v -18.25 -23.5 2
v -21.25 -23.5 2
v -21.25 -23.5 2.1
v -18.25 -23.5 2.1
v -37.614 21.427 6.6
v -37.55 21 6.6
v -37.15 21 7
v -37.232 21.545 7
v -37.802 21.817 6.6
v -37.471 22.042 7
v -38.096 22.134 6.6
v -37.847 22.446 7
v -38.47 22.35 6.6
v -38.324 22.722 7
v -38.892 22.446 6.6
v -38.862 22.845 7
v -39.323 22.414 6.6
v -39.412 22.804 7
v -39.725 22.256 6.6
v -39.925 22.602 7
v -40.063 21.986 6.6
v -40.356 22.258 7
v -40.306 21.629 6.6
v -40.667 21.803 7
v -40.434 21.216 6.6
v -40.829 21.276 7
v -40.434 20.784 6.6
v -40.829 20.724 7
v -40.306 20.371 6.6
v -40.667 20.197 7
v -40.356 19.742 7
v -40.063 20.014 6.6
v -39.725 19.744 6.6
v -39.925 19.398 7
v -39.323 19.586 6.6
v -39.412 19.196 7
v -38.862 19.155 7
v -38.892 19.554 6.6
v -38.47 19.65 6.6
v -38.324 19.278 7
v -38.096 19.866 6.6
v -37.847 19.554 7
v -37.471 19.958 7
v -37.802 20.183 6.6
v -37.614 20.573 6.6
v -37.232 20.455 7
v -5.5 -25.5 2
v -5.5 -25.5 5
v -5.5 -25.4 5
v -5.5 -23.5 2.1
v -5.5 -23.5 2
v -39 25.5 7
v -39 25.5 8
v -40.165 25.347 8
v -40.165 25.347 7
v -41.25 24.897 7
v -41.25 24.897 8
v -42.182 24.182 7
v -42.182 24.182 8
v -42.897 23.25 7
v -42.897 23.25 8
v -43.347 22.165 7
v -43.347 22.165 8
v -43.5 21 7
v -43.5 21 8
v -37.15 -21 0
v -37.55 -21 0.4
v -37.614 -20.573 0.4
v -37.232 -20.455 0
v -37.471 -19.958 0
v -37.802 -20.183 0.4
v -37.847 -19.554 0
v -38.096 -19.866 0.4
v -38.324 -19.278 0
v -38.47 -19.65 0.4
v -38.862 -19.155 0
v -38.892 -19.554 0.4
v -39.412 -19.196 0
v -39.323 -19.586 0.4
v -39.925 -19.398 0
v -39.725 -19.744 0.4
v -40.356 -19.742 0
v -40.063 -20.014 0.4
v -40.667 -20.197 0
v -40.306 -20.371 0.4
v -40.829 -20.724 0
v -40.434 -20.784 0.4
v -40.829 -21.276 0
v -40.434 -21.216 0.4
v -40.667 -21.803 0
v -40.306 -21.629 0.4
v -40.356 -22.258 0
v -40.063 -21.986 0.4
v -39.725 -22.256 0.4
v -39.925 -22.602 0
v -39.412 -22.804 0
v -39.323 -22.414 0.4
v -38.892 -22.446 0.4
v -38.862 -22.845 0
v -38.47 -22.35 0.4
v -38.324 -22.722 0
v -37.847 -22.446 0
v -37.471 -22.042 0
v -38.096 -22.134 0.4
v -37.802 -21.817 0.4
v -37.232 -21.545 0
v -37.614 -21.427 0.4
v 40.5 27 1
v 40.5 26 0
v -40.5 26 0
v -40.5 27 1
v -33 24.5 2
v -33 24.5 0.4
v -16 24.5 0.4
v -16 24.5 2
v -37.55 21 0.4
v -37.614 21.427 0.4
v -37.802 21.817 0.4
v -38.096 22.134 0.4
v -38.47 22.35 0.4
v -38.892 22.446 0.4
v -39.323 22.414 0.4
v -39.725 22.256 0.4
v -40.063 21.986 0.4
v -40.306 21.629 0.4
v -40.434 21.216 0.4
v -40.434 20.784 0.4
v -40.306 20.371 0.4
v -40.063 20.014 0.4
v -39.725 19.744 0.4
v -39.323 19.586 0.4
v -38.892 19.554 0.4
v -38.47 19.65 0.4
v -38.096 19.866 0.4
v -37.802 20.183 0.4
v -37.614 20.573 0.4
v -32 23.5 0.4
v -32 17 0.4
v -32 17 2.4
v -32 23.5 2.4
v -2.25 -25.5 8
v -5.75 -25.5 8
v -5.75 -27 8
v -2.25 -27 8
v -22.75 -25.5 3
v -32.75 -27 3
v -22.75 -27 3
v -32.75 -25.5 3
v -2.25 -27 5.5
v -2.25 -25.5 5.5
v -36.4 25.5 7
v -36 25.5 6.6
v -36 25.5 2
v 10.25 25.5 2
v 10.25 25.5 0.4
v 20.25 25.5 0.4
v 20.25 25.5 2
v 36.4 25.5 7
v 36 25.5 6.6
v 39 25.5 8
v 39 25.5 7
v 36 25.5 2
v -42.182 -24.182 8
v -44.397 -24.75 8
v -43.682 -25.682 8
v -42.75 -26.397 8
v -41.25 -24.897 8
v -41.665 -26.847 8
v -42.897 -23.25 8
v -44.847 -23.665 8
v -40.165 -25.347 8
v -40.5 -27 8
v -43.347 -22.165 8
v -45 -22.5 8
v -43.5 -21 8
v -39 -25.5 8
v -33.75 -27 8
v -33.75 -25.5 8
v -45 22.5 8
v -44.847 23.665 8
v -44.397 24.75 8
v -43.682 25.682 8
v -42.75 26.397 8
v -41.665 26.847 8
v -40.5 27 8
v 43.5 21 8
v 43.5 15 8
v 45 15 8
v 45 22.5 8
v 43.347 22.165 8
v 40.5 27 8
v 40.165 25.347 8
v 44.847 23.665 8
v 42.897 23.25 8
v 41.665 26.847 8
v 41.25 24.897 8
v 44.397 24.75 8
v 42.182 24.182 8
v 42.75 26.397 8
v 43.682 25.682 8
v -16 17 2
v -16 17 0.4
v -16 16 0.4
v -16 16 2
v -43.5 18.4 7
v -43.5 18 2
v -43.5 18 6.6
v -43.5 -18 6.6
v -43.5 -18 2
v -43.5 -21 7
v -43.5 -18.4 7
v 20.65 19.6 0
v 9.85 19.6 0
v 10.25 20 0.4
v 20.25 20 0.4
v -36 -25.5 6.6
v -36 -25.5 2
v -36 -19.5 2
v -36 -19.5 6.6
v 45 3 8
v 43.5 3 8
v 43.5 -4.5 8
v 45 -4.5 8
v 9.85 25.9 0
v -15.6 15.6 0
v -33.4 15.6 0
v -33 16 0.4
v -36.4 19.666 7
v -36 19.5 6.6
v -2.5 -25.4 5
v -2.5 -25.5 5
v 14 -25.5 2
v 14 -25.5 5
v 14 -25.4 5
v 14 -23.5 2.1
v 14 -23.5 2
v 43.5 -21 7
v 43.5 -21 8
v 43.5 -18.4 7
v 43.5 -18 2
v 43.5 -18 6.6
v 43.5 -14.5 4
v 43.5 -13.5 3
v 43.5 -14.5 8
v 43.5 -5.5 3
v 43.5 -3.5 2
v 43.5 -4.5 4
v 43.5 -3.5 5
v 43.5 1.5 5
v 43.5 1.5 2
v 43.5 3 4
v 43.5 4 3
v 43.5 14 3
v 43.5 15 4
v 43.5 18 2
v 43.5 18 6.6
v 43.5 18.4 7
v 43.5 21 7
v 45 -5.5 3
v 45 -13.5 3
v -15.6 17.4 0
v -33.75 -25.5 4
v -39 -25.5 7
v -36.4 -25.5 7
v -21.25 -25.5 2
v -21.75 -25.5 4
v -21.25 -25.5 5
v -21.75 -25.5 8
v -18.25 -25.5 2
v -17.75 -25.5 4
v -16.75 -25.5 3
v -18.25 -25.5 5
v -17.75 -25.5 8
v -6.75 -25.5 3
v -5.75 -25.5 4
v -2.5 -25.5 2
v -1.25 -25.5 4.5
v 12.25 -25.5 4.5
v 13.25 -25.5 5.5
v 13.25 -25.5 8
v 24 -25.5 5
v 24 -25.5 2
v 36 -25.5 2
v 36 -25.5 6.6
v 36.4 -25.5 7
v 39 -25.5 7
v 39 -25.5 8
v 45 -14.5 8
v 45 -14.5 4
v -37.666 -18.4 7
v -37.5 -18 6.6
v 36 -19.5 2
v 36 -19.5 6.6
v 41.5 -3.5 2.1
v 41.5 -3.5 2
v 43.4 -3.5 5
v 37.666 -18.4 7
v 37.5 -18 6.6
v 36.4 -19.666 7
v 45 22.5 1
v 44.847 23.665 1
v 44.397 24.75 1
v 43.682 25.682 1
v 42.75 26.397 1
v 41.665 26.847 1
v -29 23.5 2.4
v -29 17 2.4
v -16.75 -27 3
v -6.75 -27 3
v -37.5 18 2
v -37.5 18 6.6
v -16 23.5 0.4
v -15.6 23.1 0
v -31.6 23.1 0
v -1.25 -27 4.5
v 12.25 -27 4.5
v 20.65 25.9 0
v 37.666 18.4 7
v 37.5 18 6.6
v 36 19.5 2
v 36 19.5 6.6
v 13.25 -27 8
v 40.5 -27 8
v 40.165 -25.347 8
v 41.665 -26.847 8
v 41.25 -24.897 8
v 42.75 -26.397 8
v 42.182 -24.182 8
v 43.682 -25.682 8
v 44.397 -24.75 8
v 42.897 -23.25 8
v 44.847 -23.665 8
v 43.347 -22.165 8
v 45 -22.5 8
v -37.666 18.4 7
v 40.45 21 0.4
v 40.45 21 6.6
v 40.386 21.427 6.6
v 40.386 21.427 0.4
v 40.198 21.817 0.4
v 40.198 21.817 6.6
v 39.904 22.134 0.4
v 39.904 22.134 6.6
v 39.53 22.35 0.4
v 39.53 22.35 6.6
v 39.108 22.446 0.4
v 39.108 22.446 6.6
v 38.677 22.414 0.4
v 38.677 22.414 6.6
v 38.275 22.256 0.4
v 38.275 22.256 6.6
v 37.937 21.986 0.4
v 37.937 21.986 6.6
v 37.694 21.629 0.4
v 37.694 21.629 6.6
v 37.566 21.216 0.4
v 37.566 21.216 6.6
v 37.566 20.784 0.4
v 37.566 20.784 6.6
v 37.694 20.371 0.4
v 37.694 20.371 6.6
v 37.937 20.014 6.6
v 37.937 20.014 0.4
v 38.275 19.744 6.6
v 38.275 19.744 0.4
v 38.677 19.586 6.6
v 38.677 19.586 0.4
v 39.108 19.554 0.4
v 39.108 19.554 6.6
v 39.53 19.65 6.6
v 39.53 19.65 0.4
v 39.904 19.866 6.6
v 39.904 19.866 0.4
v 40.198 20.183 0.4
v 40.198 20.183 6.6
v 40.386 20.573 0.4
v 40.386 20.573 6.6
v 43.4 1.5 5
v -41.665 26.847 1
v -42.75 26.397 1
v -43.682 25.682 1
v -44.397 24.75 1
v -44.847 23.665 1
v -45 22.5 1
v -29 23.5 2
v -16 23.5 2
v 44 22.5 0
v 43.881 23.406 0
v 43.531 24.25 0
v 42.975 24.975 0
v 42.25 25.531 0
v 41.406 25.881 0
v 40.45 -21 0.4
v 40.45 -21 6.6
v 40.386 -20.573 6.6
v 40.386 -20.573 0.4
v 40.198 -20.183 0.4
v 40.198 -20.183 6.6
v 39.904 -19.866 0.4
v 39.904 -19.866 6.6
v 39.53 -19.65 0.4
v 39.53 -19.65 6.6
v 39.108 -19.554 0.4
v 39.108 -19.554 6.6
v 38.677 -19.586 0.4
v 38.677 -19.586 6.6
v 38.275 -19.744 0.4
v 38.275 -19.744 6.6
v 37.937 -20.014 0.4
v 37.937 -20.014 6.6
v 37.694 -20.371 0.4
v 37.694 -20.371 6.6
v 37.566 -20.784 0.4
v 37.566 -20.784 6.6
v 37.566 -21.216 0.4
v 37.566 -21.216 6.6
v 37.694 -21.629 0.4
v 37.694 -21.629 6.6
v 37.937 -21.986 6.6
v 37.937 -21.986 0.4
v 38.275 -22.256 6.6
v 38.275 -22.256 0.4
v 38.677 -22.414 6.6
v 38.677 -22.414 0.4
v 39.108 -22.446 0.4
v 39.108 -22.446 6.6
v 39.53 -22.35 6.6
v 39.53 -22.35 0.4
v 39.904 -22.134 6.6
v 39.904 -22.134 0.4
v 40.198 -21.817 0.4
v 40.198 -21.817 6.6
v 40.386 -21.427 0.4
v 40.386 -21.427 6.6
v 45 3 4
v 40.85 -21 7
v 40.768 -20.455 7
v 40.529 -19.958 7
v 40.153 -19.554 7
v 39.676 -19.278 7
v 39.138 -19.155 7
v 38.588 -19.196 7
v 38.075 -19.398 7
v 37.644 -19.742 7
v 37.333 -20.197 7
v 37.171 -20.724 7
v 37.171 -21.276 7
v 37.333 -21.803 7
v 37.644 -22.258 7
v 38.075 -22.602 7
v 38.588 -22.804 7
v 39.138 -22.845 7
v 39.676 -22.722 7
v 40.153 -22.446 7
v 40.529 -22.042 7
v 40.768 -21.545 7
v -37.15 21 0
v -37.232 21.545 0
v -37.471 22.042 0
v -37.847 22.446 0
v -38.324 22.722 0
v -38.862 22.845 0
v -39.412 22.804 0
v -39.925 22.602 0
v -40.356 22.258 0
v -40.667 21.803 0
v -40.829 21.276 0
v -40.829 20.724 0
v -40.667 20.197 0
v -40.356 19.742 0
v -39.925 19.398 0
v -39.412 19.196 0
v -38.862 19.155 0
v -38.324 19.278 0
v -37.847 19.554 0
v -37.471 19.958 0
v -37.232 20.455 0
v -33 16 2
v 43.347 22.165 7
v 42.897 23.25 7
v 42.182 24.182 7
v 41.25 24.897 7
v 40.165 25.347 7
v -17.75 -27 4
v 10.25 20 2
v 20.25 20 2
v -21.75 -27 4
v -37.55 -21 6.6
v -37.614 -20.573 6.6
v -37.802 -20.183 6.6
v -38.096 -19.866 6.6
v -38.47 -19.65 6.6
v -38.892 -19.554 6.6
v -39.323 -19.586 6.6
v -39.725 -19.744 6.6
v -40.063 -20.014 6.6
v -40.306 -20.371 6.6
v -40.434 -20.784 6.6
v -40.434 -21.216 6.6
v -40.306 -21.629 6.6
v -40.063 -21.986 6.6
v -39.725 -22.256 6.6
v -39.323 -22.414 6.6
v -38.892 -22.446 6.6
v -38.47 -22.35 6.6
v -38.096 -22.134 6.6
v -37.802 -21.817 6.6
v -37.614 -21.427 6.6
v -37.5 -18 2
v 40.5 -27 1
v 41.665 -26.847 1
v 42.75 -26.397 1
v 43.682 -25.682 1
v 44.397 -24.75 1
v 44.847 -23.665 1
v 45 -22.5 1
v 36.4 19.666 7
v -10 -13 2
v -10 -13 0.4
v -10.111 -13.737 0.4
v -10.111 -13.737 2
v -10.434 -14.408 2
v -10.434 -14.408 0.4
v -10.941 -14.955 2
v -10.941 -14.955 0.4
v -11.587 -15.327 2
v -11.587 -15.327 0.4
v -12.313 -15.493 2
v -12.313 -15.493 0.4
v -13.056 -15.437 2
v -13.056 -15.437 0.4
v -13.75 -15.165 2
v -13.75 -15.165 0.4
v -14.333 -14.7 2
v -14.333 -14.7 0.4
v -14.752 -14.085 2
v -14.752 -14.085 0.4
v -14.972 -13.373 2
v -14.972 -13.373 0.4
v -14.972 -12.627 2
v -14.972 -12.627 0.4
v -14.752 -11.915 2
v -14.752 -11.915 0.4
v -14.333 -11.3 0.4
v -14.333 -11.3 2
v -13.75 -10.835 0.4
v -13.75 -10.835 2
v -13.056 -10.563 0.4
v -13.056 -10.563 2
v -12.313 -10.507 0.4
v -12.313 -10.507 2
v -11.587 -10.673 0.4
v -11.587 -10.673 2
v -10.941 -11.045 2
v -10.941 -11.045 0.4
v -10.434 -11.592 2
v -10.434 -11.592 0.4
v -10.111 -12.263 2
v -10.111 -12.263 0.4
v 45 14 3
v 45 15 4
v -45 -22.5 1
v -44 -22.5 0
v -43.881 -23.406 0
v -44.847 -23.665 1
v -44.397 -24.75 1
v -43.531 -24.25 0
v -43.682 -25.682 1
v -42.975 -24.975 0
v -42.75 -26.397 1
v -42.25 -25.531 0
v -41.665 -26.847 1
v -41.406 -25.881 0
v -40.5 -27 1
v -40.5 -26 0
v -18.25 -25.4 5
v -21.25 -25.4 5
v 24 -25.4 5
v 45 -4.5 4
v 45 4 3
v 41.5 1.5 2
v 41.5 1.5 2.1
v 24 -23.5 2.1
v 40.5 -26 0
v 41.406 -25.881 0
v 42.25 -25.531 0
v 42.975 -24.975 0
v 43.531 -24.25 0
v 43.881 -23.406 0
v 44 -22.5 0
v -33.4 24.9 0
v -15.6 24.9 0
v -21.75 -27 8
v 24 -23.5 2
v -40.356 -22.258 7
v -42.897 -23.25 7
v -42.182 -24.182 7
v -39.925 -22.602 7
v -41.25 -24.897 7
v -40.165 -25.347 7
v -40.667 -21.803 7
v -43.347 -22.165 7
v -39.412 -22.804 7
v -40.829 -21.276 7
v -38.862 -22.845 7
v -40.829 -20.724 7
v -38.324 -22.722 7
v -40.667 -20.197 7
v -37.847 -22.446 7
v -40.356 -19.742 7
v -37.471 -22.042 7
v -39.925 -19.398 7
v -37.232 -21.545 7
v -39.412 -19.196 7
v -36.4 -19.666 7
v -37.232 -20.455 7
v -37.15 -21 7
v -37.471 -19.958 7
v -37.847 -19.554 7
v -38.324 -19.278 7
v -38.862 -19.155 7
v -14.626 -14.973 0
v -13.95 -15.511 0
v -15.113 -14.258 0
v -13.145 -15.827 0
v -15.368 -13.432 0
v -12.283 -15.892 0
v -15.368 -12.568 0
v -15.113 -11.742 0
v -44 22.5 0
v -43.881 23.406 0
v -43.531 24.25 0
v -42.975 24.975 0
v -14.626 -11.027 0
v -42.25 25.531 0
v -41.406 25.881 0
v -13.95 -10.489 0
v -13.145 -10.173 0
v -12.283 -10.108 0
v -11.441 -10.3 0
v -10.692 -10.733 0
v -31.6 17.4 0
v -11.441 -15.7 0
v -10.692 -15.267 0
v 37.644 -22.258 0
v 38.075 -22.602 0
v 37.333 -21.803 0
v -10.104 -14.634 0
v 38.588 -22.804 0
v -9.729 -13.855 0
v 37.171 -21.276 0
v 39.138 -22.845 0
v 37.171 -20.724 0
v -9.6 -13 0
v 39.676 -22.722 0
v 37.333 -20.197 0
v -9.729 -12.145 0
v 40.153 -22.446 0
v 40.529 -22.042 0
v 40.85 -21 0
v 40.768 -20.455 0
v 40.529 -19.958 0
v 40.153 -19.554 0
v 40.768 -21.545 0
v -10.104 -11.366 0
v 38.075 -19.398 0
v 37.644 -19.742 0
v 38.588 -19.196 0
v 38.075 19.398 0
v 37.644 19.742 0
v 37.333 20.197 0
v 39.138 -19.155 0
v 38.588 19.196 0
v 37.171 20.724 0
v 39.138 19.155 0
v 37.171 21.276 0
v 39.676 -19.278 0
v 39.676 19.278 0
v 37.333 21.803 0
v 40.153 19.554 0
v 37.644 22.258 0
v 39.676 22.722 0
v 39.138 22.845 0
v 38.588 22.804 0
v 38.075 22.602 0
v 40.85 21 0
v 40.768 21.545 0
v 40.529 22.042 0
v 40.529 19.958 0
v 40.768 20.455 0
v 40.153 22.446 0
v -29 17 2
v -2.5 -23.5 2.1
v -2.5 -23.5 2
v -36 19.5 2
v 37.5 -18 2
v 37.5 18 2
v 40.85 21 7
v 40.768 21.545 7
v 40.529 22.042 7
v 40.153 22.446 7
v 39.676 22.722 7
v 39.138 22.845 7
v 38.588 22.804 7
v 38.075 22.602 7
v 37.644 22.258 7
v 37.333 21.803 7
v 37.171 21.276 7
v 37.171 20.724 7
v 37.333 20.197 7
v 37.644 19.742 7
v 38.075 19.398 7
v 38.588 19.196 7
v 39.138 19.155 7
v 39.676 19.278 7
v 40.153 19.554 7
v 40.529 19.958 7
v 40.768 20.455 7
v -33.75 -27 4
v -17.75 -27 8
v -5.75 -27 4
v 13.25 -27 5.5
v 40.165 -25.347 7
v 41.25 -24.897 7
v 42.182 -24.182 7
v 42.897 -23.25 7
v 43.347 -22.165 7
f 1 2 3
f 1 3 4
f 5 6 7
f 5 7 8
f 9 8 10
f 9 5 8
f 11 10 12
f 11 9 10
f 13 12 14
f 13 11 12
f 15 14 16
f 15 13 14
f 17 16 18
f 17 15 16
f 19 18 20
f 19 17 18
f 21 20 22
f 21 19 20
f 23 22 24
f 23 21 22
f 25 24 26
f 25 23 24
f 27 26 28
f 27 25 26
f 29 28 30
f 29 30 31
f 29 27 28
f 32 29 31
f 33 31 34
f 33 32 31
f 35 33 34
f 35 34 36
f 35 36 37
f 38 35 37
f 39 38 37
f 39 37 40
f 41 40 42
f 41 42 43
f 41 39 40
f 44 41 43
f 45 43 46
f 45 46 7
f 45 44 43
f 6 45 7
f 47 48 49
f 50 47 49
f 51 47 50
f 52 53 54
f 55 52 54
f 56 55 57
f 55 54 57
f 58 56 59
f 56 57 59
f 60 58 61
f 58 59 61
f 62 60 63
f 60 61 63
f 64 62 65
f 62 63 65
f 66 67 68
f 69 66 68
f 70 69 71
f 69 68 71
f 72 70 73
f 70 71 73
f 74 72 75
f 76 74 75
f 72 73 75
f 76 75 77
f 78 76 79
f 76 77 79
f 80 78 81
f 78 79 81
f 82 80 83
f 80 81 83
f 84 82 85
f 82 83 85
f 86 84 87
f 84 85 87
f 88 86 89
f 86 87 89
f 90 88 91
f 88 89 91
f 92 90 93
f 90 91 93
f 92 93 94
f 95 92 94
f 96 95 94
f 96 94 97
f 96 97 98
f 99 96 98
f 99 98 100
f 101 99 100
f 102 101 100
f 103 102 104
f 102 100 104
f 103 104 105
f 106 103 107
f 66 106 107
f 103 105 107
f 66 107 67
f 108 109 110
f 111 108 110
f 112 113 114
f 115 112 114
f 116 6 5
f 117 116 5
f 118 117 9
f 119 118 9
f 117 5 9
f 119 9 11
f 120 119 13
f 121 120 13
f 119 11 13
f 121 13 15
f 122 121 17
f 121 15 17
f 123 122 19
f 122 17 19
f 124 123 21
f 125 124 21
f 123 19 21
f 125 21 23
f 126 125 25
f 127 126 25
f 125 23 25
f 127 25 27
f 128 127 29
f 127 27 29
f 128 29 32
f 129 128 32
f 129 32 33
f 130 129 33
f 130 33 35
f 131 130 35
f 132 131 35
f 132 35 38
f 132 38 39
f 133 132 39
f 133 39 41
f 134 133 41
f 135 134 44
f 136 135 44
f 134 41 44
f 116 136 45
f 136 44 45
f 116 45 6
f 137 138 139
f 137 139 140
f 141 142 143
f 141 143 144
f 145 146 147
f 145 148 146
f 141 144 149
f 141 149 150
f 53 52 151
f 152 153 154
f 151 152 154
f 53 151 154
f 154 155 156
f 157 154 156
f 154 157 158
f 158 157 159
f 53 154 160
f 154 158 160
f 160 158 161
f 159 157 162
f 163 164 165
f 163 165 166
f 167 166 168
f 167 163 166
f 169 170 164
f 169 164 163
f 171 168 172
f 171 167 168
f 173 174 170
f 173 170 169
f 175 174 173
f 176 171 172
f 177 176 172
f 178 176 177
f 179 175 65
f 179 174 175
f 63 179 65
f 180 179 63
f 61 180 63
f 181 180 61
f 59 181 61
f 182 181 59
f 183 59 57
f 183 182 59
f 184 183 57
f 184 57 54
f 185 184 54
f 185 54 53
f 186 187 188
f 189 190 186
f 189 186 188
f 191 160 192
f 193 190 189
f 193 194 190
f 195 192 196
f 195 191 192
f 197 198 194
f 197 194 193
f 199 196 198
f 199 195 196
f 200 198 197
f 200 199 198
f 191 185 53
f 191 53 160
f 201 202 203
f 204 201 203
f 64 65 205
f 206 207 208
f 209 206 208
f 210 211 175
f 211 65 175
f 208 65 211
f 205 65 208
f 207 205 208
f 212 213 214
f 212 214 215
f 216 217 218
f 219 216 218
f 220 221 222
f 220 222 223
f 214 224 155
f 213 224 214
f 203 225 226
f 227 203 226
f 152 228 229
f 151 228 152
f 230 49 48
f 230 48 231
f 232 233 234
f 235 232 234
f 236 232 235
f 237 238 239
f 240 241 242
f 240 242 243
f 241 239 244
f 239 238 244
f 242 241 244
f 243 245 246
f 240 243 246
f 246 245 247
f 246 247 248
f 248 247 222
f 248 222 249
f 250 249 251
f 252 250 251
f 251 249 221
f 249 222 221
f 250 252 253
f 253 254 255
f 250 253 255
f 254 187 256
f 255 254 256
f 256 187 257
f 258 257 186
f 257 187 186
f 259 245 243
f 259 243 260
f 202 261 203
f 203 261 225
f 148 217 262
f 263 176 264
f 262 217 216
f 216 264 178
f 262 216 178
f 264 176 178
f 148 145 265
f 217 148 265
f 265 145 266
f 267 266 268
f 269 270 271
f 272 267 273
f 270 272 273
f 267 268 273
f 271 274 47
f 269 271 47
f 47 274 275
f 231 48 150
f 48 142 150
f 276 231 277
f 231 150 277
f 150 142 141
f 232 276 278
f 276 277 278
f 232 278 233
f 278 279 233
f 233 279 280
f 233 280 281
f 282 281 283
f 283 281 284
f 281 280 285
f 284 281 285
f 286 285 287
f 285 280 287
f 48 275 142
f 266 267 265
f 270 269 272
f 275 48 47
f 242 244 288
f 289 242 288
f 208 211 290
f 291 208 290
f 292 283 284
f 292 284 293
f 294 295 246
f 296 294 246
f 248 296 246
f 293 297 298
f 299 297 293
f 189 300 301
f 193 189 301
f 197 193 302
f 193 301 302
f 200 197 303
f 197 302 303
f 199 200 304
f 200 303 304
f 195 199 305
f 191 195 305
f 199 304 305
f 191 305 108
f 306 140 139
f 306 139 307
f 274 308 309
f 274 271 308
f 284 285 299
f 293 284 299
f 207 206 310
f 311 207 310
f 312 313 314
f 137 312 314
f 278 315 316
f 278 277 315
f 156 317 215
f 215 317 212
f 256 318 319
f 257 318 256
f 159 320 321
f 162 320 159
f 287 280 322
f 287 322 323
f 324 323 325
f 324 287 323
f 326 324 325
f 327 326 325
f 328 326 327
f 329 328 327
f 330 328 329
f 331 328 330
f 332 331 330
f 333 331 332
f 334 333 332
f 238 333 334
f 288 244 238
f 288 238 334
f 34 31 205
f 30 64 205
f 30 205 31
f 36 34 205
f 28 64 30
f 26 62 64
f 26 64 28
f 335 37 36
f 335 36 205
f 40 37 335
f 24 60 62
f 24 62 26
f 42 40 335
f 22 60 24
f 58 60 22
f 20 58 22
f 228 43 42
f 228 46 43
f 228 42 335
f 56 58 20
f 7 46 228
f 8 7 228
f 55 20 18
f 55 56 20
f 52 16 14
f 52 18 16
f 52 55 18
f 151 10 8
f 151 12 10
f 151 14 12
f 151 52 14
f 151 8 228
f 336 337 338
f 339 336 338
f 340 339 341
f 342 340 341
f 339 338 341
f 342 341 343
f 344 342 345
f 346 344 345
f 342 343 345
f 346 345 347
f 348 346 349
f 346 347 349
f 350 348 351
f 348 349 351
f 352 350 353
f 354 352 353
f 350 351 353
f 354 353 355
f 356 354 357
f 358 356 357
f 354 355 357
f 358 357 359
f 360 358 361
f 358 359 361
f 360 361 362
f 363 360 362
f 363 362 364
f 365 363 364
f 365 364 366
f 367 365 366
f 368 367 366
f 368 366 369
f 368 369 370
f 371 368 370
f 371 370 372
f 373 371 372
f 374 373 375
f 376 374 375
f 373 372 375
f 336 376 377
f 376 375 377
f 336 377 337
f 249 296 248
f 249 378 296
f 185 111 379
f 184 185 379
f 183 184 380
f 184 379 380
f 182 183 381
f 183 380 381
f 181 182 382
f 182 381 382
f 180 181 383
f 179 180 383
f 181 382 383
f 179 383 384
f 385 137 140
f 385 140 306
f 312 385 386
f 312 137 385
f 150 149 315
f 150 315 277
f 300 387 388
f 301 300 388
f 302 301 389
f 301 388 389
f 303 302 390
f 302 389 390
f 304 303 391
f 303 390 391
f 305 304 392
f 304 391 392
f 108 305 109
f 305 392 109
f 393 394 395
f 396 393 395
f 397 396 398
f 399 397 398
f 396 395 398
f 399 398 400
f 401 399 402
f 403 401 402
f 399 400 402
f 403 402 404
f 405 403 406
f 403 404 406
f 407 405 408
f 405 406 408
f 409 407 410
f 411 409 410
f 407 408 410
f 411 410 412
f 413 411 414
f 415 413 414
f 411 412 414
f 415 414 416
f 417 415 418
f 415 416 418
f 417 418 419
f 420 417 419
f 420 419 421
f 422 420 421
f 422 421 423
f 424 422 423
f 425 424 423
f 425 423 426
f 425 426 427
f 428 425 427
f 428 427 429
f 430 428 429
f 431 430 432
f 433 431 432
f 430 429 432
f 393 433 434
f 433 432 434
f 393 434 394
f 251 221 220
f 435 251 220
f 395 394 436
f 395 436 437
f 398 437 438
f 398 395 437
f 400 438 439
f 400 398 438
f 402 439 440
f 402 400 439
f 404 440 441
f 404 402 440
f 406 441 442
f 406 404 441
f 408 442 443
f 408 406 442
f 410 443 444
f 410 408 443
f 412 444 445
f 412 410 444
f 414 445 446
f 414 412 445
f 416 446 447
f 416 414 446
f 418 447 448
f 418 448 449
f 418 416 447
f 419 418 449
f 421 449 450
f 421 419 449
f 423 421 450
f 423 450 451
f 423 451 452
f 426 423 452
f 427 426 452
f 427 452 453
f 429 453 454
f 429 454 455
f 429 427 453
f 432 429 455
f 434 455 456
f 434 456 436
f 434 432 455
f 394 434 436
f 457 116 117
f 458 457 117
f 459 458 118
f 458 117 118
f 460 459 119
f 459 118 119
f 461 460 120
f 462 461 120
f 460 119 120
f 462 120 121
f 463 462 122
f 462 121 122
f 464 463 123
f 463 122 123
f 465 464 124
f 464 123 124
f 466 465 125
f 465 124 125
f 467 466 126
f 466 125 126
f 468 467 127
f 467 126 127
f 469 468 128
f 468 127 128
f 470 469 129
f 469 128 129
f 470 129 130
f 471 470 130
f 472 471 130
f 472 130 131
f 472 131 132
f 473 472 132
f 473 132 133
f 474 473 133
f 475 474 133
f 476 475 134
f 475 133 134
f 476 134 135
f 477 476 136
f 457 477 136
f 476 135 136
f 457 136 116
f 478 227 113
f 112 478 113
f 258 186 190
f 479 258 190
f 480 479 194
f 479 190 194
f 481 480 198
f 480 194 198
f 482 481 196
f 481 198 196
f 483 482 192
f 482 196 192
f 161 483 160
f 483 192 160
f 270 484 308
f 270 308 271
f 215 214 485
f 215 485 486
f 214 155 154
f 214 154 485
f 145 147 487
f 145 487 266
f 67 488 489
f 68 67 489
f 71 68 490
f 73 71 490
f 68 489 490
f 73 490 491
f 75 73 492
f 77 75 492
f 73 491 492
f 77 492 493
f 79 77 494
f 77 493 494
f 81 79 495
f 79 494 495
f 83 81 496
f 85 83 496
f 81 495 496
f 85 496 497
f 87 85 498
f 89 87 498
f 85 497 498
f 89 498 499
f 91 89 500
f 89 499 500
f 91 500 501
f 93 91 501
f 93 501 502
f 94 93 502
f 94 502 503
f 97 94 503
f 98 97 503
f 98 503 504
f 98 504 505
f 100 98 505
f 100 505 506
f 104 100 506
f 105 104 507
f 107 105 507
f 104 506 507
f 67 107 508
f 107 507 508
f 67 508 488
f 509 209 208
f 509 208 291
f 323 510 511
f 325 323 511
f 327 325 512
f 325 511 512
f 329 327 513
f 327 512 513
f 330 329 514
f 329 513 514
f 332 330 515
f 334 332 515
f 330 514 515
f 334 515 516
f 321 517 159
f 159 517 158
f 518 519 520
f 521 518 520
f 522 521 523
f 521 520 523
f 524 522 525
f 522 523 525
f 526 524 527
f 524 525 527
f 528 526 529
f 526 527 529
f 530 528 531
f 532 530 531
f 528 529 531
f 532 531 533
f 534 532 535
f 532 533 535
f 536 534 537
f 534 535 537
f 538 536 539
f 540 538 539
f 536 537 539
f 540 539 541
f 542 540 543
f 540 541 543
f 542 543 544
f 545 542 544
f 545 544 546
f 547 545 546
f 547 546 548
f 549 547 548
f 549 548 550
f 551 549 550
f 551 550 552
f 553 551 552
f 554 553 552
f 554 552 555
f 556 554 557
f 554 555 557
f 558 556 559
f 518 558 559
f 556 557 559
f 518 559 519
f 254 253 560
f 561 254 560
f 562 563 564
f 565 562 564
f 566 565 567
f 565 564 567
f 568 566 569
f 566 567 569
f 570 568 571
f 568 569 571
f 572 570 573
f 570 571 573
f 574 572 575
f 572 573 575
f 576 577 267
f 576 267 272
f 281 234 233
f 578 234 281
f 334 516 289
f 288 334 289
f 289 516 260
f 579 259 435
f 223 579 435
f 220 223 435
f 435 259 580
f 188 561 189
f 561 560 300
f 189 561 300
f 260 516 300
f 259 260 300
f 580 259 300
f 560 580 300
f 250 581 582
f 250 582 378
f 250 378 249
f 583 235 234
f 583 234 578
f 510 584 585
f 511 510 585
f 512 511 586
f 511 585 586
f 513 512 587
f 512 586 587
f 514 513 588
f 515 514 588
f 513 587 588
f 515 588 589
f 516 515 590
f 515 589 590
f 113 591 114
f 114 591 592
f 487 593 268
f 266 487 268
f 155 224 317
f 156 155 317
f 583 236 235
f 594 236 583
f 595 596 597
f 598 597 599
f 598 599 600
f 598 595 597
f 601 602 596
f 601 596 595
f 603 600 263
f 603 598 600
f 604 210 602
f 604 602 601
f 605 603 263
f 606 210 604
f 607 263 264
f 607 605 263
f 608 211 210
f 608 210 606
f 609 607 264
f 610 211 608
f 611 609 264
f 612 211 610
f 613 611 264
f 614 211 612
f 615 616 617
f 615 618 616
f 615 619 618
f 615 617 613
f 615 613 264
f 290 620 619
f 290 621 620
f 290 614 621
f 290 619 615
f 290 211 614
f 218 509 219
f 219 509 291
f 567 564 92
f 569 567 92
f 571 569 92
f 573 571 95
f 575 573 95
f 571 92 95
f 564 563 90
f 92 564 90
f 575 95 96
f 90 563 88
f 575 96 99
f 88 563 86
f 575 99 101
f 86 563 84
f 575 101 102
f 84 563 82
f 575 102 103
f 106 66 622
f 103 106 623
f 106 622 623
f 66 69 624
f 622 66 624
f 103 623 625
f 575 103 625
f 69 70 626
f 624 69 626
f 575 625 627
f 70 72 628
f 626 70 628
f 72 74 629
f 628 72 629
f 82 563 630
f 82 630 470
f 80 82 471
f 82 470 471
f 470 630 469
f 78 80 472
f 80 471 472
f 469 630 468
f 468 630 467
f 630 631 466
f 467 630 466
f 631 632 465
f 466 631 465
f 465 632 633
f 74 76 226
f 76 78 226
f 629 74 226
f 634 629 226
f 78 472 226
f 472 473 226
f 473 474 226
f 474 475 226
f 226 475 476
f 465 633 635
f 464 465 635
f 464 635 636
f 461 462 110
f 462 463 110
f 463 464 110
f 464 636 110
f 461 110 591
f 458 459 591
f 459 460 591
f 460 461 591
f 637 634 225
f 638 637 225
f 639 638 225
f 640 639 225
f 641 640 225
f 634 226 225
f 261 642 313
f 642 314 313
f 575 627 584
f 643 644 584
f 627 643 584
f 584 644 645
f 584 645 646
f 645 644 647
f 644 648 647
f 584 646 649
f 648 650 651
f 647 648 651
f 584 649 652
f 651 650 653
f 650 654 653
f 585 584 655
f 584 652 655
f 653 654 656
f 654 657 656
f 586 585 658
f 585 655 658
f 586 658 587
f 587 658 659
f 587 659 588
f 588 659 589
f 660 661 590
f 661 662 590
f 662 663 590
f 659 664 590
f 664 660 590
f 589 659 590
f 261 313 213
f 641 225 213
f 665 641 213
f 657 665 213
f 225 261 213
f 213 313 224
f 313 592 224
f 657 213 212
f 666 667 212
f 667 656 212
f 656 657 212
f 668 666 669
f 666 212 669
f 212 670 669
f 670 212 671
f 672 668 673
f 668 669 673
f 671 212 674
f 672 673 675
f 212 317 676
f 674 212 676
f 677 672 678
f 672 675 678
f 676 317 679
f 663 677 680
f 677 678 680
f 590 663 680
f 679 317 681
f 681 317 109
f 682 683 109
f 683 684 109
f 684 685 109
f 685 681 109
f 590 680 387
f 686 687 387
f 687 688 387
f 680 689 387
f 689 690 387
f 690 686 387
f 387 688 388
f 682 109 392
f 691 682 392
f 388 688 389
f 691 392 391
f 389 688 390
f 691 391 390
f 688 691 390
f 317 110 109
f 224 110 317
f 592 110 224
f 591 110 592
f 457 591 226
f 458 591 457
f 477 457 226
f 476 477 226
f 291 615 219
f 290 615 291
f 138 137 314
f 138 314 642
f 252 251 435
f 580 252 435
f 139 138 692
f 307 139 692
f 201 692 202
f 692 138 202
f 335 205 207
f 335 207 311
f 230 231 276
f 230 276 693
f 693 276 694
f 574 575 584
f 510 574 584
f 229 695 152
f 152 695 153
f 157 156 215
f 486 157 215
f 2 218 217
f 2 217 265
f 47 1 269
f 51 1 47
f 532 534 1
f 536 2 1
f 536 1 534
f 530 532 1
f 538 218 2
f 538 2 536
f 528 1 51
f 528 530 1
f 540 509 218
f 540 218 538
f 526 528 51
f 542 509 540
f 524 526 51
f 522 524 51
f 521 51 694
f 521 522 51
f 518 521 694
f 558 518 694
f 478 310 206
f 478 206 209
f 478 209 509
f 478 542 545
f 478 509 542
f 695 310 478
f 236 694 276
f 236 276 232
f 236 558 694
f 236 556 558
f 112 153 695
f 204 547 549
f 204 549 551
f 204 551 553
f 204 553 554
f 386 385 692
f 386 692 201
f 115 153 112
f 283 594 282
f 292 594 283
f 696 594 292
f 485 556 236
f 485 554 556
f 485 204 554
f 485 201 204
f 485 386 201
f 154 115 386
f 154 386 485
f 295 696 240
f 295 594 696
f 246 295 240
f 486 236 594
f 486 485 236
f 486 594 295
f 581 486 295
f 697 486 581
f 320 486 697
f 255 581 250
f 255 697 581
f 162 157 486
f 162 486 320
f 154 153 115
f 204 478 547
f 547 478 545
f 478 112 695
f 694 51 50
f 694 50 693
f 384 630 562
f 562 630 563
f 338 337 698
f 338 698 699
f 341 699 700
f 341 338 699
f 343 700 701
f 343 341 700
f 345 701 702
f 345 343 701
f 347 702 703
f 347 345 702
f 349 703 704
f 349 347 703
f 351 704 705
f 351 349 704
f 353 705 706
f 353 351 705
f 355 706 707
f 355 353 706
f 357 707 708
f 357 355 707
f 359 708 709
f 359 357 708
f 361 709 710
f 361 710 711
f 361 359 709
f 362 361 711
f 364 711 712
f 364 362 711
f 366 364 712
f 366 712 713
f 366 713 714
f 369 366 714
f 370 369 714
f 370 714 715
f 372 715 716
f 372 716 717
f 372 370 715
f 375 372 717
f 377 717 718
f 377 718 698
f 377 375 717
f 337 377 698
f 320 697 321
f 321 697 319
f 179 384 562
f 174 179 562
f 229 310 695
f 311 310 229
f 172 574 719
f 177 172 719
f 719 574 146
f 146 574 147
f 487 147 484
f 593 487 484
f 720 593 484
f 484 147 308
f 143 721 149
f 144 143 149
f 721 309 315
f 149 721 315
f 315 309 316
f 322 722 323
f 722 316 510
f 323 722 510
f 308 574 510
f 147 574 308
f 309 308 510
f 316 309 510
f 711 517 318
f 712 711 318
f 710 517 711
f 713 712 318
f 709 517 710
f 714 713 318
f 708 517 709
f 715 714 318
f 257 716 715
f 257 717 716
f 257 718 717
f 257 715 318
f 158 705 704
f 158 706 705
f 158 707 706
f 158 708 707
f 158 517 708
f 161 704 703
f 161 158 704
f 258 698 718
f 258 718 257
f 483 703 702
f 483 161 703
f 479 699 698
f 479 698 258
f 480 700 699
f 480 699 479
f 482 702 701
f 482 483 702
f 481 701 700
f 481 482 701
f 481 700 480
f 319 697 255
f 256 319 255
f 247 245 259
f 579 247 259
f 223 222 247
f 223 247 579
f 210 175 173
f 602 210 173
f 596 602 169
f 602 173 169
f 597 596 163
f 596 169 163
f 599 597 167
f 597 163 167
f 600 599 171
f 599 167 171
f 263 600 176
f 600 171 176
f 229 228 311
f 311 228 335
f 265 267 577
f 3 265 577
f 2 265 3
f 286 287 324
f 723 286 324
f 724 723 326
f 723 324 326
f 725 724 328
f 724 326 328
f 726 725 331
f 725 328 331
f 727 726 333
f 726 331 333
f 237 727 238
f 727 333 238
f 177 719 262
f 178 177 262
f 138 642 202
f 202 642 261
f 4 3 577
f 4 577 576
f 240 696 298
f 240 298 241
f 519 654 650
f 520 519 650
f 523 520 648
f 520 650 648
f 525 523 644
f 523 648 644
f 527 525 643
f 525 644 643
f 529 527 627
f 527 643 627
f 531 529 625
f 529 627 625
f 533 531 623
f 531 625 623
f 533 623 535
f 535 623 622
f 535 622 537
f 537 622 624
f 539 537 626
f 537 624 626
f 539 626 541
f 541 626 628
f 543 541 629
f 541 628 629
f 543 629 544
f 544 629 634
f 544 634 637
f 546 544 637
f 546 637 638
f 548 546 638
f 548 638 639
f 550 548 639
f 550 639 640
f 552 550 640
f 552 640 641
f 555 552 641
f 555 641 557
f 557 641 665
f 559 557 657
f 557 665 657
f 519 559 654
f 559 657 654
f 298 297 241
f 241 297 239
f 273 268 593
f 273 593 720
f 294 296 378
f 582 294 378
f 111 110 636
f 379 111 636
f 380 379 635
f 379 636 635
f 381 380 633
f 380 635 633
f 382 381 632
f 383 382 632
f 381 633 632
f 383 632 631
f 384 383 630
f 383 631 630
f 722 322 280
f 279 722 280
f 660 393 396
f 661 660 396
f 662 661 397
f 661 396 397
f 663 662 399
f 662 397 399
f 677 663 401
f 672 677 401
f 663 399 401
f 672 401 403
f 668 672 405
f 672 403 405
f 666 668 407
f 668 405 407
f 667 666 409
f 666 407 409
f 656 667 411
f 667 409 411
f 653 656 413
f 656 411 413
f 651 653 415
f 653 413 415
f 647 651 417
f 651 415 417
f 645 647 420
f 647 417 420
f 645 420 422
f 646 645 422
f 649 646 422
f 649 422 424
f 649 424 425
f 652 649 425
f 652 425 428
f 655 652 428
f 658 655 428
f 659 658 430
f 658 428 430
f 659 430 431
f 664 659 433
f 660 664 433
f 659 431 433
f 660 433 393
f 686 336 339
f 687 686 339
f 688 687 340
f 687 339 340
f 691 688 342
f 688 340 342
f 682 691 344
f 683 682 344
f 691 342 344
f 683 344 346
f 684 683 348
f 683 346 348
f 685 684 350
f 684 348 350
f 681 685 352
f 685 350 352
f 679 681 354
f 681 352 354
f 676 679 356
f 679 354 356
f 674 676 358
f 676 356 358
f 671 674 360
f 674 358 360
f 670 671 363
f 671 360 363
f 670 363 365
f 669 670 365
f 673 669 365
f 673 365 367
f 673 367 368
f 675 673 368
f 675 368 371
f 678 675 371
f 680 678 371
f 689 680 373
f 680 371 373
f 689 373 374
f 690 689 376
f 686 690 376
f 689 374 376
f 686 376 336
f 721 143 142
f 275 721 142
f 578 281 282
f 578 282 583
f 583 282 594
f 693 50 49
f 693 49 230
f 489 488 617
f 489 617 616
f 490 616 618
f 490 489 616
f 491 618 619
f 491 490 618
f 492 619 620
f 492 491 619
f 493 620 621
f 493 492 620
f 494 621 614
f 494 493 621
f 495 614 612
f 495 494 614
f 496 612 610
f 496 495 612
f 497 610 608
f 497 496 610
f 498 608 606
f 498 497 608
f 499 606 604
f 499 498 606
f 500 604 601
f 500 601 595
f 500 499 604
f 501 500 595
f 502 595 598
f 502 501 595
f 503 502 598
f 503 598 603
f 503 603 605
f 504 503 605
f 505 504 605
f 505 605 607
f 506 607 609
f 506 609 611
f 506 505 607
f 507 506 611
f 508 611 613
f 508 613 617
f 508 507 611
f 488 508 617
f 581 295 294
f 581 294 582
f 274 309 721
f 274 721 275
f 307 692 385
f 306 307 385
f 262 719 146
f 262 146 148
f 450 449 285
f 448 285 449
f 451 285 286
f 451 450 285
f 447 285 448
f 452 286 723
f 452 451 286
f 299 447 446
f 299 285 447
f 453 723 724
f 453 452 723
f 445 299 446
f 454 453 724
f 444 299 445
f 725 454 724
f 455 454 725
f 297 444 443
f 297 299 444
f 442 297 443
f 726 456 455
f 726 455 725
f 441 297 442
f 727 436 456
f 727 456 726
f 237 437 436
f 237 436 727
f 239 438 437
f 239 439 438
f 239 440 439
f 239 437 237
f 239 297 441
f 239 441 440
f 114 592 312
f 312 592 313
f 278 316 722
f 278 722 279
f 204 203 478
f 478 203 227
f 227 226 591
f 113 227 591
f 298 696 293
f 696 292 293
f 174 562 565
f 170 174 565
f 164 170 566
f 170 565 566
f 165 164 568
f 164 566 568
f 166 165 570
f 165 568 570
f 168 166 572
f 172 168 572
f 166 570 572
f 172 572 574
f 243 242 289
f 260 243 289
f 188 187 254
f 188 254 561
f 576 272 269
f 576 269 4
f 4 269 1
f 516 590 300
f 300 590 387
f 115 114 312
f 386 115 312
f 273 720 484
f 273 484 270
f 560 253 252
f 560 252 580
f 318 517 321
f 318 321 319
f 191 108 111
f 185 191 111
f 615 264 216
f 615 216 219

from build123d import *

# Parameters (mm, degrees)
PAD_DEPTH          = 8
POCKET_DEPTH       = 6
SKETCH002_R        = 2.5
SKETCH002_W        = 10
SKETCH002_H        = 5.5
POCKET001_DEPTH    = 2
SKETCH012_W        = 3
SKETCH012_H        = 6.5
PAD004_DEPTH       = 0.4
SKETCH003_W        = 12
SKETCH003_H        = 1.5
SKETCH003_W_2      = 1.5
SKETCH003_H_2      = 10
SKETCH003_H_3      = 12
POCKET002_DEPTH    = 5
CHAMFER_SIZE       = 1
SKETCH013_W        = 15.5
SKETCH013_H        = 1.5
POCKET003_DEPTH    = 3.5
CHAMFER002_SIZE    = 1
SKETCH014_W        = 10
SKETCH014_H        = 2
SKETCH014_W_2      = 3
SKETCH014_W_3      = 2
SKETCH014_H_2      = 5
PAD005_DEPTH       = 3
SKETCH015_W        = 7.5
SKETCH015_H        = 7.5
PAD006_DEPTH       = 5
SKETCH016_R        = 1.45
POCKET004_DEPTH    = 7
CHAMFER003_SIZE    = 1.5
CHAMFER004_1_SIZE2 = 2.9
CHAMFER004_1_SIZE  = 1.9
CHAMFER004_2_SIZE2 = 2.9
CHAMFER004_2_SIZE  = 1.9
CHAMFER004_3_SIZE2 = 2.9
CHAMFER004_3_SIZE  = 1.9
CHAMFER005_SIZE2   = 1.9
CHAMFER005_SIZE    = 2.9
CHAMFER007_SIZE    = 0.4
CHAMFER008_SIZE    = 1


with BuildPart() as part:
    # Sketch → Pad (new body)
    with BuildSketch(Plane.XY):
        with BuildLine():
            Line((-40.5, -27), (40.5, -27))
            ThreePointArc((40.5, -27), (43.681981, -25.681981), (45, -22.5))
            Line((45, -22.5), (45, 22.5))
            ThreePointArc((45, 22.5), (43.681981, 25.681981), (40.5, 27))
            Line((40.5, 27), (-40.5, 27))
            ThreePointArc((-40.5, 27), (-43.681981, 25.681981), (-45, 22.5))
            Line((-45, 22.5), (-45, -22.5))
            ThreePointArc((-45, -22.5), (-43.681981, -25.681981), (-40.5, -27))
        make_face()
    extrude(amount=PAD_DEPTH)

    # Sketch001 (on Face10 of Pad) → Pocket (cut)
    with BuildSketch(Plane.XY.offset(8)):
        with BuildLine():
            Line((-39, -25.5), (39, -25.5))
            ThreePointArc((39, -25.5), (42.181981, -24.181981), (43.5, -21))
            Line((43.5, -21), (43.5, 21))
            ThreePointArc((43.5, 21), (42.181981, 24.181981), (39, 25.5))
            Line((39, 25.5), (-39, 25.5))
            ThreePointArc((-39, 25.5), (-42.181981, 24.181981), (-43.5, 21))
            Line((-43.5, 21), (-43.5, -21))
            ThreePointArc((-43.5, -21), (-42.181981, -24.181981), (-39, -25.5))
        make_face()
    extrude(amount=-POCKET_DEPTH, mode=Mode.SUBTRACT)

    # Sketch002 (on Face4 of Pocket) → Pocket001 (cut)
    with BuildSketch(Plane(origin=(0, 0, 0), x_dir=(1, 0, 0), z_dir=(0, 0, -1))):
        with Locations((-12.5, 13)):
            Circle(SKETCH002_R)
        Polygon((-16, -23.5), (-32, -23.5), (-32, -17), (-16, -17), (-16, -16), (-33, -16), (-33, -24.5), (-16, -24.5), align=None)
        with Locations((15.25, -22.75)):
            Rectangle(SKETCH002_W, SKETCH002_H)
    extrude(amount=-POCKET001_DEPTH, mode=Mode.SUBTRACT)

    # Sketch012 (on Face30 of Pocket001) → Pad004 (join)
    with BuildSketch(Plane.XY.offset(2)):
        with Locations((-30.5, 20.25)):
            Rectangle(SKETCH012_W, SKETCH012_H)
    extrude(amount=PAD004_DEPTH)

    # Sketch003 (on Face5 of Pocket001) → Pocket002 (cut)
    with BuildSketch(Plane.XY.offset(8)):
        with Locations((-11.75, -26.25)):
            Rectangle(SKETCH003_W, SKETCH003_H)
        with Locations((44.25, -9.5)):
            Rectangle(SKETCH003_W_2, SKETCH003_H_2)
        with Locations((-27.75, -26.25)):
            Rectangle(SKETCH003_W, SKETCH003_H)
        with Locations((44.25, 9)):
            Rectangle(SKETCH003_W_2, SKETCH003_H_3)
    extrude(amount=-POCKET002_DEPTH, mode=Mode.SUBTRACT)

    # Chamfer
    chamfer_edges = [part.edges().sort_by_distance(p)[0] for p in [
        (44.25, -4.5, 3),
        (-17.75, -26.25, 3),
        (-5.75, -26.25, 3),
        (44.25, -14.5, 3),
        (-33.75, -26.25, 3),
        (44.25, 15, 3),
        (44.25, 3, 3),
        (-21.75, -26.25, 3),
    ]]
    chamfer(chamfer_edges, length=CHAMFER_SIZE)

    # Sketch013 (on Face4 of Chamfer) → Pocket003 (cut)
    with BuildSketch(Plane.XY.offset(8)):
        with Locations((5.5, -26.25)):
            Rectangle(SKETCH013_W, SKETCH013_H)
    extrude(amount=-POCKET003_DEPTH, mode=Mode.SUBTRACT)

    # Chamfer002
    chamfer002_edges = [part.edges().sort_by_distance(p)[0] for p in [
        (-2.25, -26.25, 4.5),
        (13.25, -26.25, 4.5),
    ]]
    chamfer(chamfer002_edges, length=CHAMFER002_SIZE)

    # Sketch014 (on Face51 of Chamfer002) → Pad005 (join)
    with BuildSketch(Plane.XY.offset(2)):
        with Locations((19, -24.5)):
            Rectangle(SKETCH014_W, SKETCH014_H)
        with Locations((-4, -24.5)):
            Rectangle(SKETCH014_W_2, SKETCH014_H)
        with Locations((-19.75, -24.5)):
            Rectangle(SKETCH014_W_2, SKETCH014_H)
        with Locations((42.5, -1)):
            Rectangle(SKETCH014_W_3, SKETCH014_H_2)
    extrude(amount=PAD005_DEPTH)

    # Sketch015 (on Face51 of Pad005) → Pad006 (join)
    with BuildSketch(Plane.XY.offset(2)):
        with Locations((39.75, 21.75)):
            Rectangle(SKETCH015_W, SKETCH015_H)
        with Locations((-39.75, -21.75)):
            Rectangle(SKETCH015_W, SKETCH015_H)
        with Locations((-39.75, 21.75)):
            Rectangle(SKETCH015_W, SKETCH015_H)
        with Locations((39.75, -21.75)):
            Rectangle(SKETCH015_W, SKETCH015_H)
    extrude(amount=PAD006_DEPTH)

    # Sketch016 (on Face83 of Pad006) → Pocket004 (cut)
    with BuildSketch(Plane.XY.offset(7)):
        with Locations((-39, 21)):
            Circle(SKETCH016_R)
        with Locations((39, 21)):
            Circle(SKETCH016_R)
        with Locations((39, -21)):
            Circle(SKETCH016_R)
        with Locations((-39, -21)):
            Circle(SKETCH016_R)
    extrude(amount=-POCKET004_DEPTH, mode=Mode.SUBTRACT)

    # Chamfer003
    chamfer003_edges = [part.edges().sort_by_distance(p)[0] for p in [
        (-36, 18, 4.5),
        (36, 18, 4.5),
        (36, -18, 4.5),
        (-36, -18, 4.5),
    ]]
    chamfer(chamfer003_edges, length=CHAMFER003_SIZE)

    # Chamfer004 1
    chamfer004_1_edges = [part.edges().sort_by_distance(p)[0] for p in [
        (19, -23.5, 5),
    ]]
    chamfer004_1_side = part.faces().sort_by_distance((19, -24.5, 5))[0]
    chamfer(chamfer004_1_edges, length=CHAMFER004_1_SIZE, length2=CHAMFER004_1_SIZE2, reference=chamfer004_1_side)

    # Chamfer004 2
    chamfer004_2_edges = [part.edges().sort_by_distance(p)[0] for p in [
        (-4, -23.5, 5),
    ]]
    chamfer004_2_side = part.faces().sort_by_distance((-4, -24.5, 5))[0]
    chamfer(chamfer004_2_edges, length=CHAMFER004_2_SIZE, length2=CHAMFER004_2_SIZE2, reference=chamfer004_2_side)

    # Chamfer004 3
    chamfer004_3_edges = [part.edges().sort_by_distance(p)[0] for p in [
        (-19.75, -23.5, 5),
    ]]
    chamfer004_3_side = part.faces().sort_by_distance((-19.75, -24.5, 5))[0]
    chamfer(chamfer004_3_edges, length=CHAMFER004_3_SIZE, length2=CHAMFER004_3_SIZE2, reference=chamfer004_3_side)

    # Chamfer005
    chamfer005_edges = [part.edges().sort_by_distance(p)[0] for p in [
        (41.5, -1, 5),
    ]]
    chamfer005_side = part.faces().sort_by_distance((41.5, -1, 3.5))[0]
    chamfer(chamfer005_edges, length=CHAMFER005_SIZE, length2=CHAMFER005_SIZE2, reference=chamfer005_side)

    # Chamfer007
    chamfer007_edges = [part.edges().sort_by_distance(p)[0] for p in [
        (-40.45, 21, 7),
        (37.55, -21, 7),
        (-40.45, -21, 7),
        (37.55, 21, 7),
        (-36, -22.5, 7),
        (-36.75, -18.75, 7),
        (-40.5, -18, 7),
        (-40.5, 18, 7),
        (-36.75, 18.75, 7),
        (-36, 22.5, 7),
        (36, -22.5, 7),
        (36.75, -18.75, 7),
        (40.5, -18, 7),
        (40.5, 18, 7),
        (36.75, 18.75, 7),
        (36, 22.5, 7),
        (37.55, -21, 0),
        (37.55, 21, 0),
        (15.25, 20, 0),
        (20.25, 22.75, 0),
        (15.25, 25.5, 0),
        (10.25, 22.75, 0),
        (-24, 17, 0),
        (-32, 20.25, 0),
        (-24, 23.5, 0),
        (-16, 24, 0),
        (-24.5, 24.5, 0),
        (-33, 20.25, 0),
        (-24.5, 16, 0),
        (-16, 16.5, 0),
        (-40.45, 21, 0),
        (-40.45, -21, 0),
        (-15, -13, 0),
    ]]
    chamfer(chamfer007_edges, length=CHAMFER007_SIZE)

    # Chamfer008
    chamfer008_edges = [part.edges().sort_by_distance(p)[0] for p in [
        (0, -27, 0),
    ]]
    chamfer(chamfer008_edges, length=CHAMFER008_SIZE)


solid = part.part
